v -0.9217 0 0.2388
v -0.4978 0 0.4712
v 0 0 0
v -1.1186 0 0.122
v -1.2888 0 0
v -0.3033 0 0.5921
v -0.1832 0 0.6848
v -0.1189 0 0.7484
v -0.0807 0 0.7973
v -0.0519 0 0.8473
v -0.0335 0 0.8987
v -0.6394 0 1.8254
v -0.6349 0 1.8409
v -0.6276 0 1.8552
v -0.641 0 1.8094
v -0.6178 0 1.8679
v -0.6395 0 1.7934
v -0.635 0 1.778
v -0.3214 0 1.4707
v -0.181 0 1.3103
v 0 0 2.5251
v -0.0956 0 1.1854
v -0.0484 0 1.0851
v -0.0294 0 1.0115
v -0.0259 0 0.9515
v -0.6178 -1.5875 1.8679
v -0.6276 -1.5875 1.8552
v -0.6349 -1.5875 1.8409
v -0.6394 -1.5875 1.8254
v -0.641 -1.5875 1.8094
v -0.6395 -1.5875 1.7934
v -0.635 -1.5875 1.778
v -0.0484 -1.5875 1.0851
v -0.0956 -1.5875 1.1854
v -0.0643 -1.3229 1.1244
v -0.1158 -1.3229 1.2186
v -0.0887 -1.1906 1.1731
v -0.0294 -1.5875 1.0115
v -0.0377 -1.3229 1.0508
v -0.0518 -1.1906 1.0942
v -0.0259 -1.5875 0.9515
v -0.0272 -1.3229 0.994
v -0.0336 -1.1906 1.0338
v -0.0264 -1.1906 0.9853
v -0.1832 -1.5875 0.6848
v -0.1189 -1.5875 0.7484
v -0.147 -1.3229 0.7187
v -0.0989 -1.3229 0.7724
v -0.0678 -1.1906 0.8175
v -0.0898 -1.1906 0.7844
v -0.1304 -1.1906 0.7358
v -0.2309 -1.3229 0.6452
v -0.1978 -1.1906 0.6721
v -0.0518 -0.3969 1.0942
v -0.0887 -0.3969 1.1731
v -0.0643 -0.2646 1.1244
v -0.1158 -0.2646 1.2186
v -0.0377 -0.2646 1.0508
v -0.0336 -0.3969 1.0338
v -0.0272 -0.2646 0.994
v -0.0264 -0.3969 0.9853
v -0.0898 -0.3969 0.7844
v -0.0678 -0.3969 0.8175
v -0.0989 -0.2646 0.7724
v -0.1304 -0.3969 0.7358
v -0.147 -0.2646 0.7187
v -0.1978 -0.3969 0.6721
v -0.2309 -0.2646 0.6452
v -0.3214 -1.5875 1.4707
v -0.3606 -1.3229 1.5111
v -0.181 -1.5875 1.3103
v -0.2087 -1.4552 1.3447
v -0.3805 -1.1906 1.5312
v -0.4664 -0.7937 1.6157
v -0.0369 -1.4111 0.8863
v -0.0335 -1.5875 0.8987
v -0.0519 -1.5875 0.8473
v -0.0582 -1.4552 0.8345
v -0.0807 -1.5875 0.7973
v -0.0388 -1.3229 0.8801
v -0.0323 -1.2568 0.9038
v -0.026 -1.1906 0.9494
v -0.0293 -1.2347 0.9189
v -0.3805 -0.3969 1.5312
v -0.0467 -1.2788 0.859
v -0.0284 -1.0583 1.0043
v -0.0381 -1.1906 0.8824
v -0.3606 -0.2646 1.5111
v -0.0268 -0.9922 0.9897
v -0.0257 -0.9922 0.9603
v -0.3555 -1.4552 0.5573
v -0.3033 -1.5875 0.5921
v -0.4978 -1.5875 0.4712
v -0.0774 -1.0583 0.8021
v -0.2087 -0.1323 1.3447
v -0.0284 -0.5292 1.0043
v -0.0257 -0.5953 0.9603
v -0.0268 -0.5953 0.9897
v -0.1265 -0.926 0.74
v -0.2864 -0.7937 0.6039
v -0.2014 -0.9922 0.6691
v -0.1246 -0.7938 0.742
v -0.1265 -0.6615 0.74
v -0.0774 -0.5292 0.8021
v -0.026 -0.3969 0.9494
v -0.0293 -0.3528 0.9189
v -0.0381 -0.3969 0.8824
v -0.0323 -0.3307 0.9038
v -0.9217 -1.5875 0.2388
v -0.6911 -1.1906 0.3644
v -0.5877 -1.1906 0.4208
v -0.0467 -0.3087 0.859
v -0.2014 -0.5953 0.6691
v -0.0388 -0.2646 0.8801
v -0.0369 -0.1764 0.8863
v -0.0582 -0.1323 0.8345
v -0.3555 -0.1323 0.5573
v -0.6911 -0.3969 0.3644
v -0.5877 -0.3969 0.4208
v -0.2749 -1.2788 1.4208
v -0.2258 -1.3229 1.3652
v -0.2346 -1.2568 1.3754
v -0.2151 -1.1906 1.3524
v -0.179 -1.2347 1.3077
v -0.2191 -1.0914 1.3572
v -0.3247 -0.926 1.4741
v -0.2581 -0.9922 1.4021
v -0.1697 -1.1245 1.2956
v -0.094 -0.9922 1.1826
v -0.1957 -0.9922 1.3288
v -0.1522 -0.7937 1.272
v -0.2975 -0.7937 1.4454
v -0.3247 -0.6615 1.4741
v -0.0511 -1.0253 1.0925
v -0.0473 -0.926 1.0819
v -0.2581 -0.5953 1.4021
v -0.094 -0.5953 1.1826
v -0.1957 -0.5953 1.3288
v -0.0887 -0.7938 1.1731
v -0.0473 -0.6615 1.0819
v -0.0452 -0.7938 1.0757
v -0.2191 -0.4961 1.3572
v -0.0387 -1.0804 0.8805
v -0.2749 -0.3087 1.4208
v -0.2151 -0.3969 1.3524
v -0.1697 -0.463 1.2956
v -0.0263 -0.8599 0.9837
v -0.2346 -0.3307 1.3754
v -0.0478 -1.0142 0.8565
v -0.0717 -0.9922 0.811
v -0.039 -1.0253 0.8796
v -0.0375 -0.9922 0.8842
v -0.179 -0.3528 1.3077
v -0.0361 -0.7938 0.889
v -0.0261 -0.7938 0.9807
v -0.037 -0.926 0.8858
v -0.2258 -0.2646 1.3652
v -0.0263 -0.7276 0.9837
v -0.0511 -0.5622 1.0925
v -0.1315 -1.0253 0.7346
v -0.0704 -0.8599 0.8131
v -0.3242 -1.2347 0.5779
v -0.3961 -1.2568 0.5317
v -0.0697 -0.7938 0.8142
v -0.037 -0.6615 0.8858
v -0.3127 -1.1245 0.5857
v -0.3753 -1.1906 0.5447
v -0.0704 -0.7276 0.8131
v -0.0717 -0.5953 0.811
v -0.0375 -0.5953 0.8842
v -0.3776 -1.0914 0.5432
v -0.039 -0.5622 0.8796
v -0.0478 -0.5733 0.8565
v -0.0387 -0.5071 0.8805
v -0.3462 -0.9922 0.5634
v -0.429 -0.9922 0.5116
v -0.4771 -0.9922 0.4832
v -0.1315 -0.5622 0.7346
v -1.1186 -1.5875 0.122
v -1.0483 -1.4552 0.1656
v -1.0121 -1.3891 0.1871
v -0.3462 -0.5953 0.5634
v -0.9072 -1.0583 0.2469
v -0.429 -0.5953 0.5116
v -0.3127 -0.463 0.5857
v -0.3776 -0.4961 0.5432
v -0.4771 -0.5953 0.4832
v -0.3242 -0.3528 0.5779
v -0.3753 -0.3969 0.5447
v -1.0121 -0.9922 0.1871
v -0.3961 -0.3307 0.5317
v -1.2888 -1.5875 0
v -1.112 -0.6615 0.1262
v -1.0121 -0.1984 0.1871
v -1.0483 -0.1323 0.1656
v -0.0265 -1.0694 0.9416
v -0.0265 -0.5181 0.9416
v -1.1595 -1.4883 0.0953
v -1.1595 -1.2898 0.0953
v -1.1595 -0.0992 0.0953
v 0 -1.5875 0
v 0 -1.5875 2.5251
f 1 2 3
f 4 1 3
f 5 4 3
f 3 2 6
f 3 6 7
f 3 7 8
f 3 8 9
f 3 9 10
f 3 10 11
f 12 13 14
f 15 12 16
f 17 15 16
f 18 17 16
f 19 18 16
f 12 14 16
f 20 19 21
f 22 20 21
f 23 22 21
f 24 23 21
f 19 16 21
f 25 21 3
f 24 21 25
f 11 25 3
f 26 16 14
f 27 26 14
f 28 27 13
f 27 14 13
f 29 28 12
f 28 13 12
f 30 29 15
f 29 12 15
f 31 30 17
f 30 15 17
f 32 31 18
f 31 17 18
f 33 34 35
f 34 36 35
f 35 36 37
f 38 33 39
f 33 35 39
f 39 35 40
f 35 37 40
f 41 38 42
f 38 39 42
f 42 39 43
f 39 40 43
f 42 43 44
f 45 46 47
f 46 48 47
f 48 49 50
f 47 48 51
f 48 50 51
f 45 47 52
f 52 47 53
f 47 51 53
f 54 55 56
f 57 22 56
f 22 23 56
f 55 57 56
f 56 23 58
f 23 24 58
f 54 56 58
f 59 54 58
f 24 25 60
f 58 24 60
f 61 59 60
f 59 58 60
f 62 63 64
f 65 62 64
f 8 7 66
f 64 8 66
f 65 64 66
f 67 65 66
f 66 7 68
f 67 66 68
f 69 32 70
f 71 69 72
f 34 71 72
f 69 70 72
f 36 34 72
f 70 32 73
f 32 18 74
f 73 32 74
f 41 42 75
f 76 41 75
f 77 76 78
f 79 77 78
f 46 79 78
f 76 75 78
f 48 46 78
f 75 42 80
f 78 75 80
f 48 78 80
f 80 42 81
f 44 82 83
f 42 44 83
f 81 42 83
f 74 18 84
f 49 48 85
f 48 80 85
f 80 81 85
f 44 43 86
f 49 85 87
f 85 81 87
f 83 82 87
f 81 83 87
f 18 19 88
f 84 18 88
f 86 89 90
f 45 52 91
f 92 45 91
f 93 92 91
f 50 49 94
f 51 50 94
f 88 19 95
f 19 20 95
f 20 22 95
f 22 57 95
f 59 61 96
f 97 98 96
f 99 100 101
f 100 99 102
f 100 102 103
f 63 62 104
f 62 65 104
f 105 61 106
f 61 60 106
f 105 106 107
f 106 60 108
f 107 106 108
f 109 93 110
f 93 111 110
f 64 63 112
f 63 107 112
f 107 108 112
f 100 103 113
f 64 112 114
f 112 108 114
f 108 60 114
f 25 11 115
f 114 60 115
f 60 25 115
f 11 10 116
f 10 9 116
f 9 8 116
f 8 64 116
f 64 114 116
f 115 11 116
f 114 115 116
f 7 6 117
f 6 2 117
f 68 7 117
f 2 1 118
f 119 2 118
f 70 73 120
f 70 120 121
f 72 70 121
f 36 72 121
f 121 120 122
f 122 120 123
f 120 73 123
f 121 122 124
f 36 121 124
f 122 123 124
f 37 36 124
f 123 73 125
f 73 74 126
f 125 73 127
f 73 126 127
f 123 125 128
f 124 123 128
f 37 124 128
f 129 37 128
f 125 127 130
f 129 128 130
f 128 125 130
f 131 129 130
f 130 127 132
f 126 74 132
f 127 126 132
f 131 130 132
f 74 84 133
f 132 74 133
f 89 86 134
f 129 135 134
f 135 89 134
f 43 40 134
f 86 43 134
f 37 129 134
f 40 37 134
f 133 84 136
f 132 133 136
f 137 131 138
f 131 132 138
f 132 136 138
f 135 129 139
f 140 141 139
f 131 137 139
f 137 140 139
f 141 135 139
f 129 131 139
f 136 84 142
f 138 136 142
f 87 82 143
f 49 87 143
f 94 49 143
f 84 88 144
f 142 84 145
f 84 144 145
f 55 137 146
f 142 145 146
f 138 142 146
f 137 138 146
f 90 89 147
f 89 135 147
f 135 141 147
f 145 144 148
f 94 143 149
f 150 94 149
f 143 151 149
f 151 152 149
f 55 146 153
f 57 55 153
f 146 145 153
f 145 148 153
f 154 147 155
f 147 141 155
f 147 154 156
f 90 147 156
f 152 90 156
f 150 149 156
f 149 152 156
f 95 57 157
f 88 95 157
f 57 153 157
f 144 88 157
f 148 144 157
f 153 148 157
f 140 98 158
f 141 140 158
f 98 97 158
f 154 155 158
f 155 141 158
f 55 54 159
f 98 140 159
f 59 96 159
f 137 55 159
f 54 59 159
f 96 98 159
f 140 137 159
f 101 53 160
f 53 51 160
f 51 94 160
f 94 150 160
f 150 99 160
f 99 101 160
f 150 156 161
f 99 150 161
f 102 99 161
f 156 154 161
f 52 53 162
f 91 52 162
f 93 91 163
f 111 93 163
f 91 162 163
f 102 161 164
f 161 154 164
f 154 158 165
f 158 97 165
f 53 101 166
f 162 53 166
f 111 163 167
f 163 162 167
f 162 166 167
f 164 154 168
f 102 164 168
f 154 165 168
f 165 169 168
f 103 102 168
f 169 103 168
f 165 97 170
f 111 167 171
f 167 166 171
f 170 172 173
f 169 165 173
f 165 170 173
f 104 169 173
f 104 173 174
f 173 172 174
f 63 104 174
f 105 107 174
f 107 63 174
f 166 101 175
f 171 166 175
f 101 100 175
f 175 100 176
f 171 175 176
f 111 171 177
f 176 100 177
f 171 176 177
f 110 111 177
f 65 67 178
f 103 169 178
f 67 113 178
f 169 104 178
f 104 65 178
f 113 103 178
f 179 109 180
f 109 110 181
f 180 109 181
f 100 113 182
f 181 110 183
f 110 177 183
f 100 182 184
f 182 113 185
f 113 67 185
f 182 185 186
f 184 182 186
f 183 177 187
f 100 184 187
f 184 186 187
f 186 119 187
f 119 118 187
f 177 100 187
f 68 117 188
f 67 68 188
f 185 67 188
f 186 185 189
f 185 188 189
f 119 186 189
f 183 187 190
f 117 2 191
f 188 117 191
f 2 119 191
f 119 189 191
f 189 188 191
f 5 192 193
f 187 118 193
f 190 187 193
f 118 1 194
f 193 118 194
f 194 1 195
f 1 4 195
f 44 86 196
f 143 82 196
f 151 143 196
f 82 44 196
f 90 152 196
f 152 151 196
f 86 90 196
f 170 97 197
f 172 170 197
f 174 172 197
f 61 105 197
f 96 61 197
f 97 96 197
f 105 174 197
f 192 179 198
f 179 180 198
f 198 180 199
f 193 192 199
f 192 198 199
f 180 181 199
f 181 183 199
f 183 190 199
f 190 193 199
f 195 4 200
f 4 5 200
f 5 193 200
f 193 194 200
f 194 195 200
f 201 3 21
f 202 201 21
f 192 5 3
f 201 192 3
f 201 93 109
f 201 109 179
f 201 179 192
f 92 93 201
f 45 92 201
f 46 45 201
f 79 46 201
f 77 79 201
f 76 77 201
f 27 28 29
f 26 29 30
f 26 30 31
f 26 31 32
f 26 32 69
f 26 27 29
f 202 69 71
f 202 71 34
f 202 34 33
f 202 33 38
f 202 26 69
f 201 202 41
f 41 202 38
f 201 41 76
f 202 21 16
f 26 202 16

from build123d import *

# Parameters (mm, degrees)
F1_DEPTH = 1.5875


with BuildPart() as f1:
    # F0 (on Front) → F1 (new body)
    with BuildSketch(Plane.XZ):
        with BuildLine():
            Line((-1.288804342, 0), (0, 0))
            Line((0, 0), (0, 1.778))
            Line((0, 1.778), (0, 2.5250844192))
            Line((0, 2.5250844192), (-0.6177662367, 1.867863305))
            ThreePointArc((-0.6177662367, 1.867863305), (-0.6394247671, 1.8254327477), (-0.635, 1.778))
            add(Edge.make_bspline(
                [(-0.635, 1.778), (-0.3515690188, 1.5013684956), (0.5168877601, 0.7623105723), (-0.9078952262, 0.3147711822), (-1.288804342, 0)],
                knots=[0, 0, 0, 0, 0.4551462822, 1, 1, 1, 1], degree=3))
        make_face()
    extrude(amount=F1_DEPTH)


solid = f1.part
